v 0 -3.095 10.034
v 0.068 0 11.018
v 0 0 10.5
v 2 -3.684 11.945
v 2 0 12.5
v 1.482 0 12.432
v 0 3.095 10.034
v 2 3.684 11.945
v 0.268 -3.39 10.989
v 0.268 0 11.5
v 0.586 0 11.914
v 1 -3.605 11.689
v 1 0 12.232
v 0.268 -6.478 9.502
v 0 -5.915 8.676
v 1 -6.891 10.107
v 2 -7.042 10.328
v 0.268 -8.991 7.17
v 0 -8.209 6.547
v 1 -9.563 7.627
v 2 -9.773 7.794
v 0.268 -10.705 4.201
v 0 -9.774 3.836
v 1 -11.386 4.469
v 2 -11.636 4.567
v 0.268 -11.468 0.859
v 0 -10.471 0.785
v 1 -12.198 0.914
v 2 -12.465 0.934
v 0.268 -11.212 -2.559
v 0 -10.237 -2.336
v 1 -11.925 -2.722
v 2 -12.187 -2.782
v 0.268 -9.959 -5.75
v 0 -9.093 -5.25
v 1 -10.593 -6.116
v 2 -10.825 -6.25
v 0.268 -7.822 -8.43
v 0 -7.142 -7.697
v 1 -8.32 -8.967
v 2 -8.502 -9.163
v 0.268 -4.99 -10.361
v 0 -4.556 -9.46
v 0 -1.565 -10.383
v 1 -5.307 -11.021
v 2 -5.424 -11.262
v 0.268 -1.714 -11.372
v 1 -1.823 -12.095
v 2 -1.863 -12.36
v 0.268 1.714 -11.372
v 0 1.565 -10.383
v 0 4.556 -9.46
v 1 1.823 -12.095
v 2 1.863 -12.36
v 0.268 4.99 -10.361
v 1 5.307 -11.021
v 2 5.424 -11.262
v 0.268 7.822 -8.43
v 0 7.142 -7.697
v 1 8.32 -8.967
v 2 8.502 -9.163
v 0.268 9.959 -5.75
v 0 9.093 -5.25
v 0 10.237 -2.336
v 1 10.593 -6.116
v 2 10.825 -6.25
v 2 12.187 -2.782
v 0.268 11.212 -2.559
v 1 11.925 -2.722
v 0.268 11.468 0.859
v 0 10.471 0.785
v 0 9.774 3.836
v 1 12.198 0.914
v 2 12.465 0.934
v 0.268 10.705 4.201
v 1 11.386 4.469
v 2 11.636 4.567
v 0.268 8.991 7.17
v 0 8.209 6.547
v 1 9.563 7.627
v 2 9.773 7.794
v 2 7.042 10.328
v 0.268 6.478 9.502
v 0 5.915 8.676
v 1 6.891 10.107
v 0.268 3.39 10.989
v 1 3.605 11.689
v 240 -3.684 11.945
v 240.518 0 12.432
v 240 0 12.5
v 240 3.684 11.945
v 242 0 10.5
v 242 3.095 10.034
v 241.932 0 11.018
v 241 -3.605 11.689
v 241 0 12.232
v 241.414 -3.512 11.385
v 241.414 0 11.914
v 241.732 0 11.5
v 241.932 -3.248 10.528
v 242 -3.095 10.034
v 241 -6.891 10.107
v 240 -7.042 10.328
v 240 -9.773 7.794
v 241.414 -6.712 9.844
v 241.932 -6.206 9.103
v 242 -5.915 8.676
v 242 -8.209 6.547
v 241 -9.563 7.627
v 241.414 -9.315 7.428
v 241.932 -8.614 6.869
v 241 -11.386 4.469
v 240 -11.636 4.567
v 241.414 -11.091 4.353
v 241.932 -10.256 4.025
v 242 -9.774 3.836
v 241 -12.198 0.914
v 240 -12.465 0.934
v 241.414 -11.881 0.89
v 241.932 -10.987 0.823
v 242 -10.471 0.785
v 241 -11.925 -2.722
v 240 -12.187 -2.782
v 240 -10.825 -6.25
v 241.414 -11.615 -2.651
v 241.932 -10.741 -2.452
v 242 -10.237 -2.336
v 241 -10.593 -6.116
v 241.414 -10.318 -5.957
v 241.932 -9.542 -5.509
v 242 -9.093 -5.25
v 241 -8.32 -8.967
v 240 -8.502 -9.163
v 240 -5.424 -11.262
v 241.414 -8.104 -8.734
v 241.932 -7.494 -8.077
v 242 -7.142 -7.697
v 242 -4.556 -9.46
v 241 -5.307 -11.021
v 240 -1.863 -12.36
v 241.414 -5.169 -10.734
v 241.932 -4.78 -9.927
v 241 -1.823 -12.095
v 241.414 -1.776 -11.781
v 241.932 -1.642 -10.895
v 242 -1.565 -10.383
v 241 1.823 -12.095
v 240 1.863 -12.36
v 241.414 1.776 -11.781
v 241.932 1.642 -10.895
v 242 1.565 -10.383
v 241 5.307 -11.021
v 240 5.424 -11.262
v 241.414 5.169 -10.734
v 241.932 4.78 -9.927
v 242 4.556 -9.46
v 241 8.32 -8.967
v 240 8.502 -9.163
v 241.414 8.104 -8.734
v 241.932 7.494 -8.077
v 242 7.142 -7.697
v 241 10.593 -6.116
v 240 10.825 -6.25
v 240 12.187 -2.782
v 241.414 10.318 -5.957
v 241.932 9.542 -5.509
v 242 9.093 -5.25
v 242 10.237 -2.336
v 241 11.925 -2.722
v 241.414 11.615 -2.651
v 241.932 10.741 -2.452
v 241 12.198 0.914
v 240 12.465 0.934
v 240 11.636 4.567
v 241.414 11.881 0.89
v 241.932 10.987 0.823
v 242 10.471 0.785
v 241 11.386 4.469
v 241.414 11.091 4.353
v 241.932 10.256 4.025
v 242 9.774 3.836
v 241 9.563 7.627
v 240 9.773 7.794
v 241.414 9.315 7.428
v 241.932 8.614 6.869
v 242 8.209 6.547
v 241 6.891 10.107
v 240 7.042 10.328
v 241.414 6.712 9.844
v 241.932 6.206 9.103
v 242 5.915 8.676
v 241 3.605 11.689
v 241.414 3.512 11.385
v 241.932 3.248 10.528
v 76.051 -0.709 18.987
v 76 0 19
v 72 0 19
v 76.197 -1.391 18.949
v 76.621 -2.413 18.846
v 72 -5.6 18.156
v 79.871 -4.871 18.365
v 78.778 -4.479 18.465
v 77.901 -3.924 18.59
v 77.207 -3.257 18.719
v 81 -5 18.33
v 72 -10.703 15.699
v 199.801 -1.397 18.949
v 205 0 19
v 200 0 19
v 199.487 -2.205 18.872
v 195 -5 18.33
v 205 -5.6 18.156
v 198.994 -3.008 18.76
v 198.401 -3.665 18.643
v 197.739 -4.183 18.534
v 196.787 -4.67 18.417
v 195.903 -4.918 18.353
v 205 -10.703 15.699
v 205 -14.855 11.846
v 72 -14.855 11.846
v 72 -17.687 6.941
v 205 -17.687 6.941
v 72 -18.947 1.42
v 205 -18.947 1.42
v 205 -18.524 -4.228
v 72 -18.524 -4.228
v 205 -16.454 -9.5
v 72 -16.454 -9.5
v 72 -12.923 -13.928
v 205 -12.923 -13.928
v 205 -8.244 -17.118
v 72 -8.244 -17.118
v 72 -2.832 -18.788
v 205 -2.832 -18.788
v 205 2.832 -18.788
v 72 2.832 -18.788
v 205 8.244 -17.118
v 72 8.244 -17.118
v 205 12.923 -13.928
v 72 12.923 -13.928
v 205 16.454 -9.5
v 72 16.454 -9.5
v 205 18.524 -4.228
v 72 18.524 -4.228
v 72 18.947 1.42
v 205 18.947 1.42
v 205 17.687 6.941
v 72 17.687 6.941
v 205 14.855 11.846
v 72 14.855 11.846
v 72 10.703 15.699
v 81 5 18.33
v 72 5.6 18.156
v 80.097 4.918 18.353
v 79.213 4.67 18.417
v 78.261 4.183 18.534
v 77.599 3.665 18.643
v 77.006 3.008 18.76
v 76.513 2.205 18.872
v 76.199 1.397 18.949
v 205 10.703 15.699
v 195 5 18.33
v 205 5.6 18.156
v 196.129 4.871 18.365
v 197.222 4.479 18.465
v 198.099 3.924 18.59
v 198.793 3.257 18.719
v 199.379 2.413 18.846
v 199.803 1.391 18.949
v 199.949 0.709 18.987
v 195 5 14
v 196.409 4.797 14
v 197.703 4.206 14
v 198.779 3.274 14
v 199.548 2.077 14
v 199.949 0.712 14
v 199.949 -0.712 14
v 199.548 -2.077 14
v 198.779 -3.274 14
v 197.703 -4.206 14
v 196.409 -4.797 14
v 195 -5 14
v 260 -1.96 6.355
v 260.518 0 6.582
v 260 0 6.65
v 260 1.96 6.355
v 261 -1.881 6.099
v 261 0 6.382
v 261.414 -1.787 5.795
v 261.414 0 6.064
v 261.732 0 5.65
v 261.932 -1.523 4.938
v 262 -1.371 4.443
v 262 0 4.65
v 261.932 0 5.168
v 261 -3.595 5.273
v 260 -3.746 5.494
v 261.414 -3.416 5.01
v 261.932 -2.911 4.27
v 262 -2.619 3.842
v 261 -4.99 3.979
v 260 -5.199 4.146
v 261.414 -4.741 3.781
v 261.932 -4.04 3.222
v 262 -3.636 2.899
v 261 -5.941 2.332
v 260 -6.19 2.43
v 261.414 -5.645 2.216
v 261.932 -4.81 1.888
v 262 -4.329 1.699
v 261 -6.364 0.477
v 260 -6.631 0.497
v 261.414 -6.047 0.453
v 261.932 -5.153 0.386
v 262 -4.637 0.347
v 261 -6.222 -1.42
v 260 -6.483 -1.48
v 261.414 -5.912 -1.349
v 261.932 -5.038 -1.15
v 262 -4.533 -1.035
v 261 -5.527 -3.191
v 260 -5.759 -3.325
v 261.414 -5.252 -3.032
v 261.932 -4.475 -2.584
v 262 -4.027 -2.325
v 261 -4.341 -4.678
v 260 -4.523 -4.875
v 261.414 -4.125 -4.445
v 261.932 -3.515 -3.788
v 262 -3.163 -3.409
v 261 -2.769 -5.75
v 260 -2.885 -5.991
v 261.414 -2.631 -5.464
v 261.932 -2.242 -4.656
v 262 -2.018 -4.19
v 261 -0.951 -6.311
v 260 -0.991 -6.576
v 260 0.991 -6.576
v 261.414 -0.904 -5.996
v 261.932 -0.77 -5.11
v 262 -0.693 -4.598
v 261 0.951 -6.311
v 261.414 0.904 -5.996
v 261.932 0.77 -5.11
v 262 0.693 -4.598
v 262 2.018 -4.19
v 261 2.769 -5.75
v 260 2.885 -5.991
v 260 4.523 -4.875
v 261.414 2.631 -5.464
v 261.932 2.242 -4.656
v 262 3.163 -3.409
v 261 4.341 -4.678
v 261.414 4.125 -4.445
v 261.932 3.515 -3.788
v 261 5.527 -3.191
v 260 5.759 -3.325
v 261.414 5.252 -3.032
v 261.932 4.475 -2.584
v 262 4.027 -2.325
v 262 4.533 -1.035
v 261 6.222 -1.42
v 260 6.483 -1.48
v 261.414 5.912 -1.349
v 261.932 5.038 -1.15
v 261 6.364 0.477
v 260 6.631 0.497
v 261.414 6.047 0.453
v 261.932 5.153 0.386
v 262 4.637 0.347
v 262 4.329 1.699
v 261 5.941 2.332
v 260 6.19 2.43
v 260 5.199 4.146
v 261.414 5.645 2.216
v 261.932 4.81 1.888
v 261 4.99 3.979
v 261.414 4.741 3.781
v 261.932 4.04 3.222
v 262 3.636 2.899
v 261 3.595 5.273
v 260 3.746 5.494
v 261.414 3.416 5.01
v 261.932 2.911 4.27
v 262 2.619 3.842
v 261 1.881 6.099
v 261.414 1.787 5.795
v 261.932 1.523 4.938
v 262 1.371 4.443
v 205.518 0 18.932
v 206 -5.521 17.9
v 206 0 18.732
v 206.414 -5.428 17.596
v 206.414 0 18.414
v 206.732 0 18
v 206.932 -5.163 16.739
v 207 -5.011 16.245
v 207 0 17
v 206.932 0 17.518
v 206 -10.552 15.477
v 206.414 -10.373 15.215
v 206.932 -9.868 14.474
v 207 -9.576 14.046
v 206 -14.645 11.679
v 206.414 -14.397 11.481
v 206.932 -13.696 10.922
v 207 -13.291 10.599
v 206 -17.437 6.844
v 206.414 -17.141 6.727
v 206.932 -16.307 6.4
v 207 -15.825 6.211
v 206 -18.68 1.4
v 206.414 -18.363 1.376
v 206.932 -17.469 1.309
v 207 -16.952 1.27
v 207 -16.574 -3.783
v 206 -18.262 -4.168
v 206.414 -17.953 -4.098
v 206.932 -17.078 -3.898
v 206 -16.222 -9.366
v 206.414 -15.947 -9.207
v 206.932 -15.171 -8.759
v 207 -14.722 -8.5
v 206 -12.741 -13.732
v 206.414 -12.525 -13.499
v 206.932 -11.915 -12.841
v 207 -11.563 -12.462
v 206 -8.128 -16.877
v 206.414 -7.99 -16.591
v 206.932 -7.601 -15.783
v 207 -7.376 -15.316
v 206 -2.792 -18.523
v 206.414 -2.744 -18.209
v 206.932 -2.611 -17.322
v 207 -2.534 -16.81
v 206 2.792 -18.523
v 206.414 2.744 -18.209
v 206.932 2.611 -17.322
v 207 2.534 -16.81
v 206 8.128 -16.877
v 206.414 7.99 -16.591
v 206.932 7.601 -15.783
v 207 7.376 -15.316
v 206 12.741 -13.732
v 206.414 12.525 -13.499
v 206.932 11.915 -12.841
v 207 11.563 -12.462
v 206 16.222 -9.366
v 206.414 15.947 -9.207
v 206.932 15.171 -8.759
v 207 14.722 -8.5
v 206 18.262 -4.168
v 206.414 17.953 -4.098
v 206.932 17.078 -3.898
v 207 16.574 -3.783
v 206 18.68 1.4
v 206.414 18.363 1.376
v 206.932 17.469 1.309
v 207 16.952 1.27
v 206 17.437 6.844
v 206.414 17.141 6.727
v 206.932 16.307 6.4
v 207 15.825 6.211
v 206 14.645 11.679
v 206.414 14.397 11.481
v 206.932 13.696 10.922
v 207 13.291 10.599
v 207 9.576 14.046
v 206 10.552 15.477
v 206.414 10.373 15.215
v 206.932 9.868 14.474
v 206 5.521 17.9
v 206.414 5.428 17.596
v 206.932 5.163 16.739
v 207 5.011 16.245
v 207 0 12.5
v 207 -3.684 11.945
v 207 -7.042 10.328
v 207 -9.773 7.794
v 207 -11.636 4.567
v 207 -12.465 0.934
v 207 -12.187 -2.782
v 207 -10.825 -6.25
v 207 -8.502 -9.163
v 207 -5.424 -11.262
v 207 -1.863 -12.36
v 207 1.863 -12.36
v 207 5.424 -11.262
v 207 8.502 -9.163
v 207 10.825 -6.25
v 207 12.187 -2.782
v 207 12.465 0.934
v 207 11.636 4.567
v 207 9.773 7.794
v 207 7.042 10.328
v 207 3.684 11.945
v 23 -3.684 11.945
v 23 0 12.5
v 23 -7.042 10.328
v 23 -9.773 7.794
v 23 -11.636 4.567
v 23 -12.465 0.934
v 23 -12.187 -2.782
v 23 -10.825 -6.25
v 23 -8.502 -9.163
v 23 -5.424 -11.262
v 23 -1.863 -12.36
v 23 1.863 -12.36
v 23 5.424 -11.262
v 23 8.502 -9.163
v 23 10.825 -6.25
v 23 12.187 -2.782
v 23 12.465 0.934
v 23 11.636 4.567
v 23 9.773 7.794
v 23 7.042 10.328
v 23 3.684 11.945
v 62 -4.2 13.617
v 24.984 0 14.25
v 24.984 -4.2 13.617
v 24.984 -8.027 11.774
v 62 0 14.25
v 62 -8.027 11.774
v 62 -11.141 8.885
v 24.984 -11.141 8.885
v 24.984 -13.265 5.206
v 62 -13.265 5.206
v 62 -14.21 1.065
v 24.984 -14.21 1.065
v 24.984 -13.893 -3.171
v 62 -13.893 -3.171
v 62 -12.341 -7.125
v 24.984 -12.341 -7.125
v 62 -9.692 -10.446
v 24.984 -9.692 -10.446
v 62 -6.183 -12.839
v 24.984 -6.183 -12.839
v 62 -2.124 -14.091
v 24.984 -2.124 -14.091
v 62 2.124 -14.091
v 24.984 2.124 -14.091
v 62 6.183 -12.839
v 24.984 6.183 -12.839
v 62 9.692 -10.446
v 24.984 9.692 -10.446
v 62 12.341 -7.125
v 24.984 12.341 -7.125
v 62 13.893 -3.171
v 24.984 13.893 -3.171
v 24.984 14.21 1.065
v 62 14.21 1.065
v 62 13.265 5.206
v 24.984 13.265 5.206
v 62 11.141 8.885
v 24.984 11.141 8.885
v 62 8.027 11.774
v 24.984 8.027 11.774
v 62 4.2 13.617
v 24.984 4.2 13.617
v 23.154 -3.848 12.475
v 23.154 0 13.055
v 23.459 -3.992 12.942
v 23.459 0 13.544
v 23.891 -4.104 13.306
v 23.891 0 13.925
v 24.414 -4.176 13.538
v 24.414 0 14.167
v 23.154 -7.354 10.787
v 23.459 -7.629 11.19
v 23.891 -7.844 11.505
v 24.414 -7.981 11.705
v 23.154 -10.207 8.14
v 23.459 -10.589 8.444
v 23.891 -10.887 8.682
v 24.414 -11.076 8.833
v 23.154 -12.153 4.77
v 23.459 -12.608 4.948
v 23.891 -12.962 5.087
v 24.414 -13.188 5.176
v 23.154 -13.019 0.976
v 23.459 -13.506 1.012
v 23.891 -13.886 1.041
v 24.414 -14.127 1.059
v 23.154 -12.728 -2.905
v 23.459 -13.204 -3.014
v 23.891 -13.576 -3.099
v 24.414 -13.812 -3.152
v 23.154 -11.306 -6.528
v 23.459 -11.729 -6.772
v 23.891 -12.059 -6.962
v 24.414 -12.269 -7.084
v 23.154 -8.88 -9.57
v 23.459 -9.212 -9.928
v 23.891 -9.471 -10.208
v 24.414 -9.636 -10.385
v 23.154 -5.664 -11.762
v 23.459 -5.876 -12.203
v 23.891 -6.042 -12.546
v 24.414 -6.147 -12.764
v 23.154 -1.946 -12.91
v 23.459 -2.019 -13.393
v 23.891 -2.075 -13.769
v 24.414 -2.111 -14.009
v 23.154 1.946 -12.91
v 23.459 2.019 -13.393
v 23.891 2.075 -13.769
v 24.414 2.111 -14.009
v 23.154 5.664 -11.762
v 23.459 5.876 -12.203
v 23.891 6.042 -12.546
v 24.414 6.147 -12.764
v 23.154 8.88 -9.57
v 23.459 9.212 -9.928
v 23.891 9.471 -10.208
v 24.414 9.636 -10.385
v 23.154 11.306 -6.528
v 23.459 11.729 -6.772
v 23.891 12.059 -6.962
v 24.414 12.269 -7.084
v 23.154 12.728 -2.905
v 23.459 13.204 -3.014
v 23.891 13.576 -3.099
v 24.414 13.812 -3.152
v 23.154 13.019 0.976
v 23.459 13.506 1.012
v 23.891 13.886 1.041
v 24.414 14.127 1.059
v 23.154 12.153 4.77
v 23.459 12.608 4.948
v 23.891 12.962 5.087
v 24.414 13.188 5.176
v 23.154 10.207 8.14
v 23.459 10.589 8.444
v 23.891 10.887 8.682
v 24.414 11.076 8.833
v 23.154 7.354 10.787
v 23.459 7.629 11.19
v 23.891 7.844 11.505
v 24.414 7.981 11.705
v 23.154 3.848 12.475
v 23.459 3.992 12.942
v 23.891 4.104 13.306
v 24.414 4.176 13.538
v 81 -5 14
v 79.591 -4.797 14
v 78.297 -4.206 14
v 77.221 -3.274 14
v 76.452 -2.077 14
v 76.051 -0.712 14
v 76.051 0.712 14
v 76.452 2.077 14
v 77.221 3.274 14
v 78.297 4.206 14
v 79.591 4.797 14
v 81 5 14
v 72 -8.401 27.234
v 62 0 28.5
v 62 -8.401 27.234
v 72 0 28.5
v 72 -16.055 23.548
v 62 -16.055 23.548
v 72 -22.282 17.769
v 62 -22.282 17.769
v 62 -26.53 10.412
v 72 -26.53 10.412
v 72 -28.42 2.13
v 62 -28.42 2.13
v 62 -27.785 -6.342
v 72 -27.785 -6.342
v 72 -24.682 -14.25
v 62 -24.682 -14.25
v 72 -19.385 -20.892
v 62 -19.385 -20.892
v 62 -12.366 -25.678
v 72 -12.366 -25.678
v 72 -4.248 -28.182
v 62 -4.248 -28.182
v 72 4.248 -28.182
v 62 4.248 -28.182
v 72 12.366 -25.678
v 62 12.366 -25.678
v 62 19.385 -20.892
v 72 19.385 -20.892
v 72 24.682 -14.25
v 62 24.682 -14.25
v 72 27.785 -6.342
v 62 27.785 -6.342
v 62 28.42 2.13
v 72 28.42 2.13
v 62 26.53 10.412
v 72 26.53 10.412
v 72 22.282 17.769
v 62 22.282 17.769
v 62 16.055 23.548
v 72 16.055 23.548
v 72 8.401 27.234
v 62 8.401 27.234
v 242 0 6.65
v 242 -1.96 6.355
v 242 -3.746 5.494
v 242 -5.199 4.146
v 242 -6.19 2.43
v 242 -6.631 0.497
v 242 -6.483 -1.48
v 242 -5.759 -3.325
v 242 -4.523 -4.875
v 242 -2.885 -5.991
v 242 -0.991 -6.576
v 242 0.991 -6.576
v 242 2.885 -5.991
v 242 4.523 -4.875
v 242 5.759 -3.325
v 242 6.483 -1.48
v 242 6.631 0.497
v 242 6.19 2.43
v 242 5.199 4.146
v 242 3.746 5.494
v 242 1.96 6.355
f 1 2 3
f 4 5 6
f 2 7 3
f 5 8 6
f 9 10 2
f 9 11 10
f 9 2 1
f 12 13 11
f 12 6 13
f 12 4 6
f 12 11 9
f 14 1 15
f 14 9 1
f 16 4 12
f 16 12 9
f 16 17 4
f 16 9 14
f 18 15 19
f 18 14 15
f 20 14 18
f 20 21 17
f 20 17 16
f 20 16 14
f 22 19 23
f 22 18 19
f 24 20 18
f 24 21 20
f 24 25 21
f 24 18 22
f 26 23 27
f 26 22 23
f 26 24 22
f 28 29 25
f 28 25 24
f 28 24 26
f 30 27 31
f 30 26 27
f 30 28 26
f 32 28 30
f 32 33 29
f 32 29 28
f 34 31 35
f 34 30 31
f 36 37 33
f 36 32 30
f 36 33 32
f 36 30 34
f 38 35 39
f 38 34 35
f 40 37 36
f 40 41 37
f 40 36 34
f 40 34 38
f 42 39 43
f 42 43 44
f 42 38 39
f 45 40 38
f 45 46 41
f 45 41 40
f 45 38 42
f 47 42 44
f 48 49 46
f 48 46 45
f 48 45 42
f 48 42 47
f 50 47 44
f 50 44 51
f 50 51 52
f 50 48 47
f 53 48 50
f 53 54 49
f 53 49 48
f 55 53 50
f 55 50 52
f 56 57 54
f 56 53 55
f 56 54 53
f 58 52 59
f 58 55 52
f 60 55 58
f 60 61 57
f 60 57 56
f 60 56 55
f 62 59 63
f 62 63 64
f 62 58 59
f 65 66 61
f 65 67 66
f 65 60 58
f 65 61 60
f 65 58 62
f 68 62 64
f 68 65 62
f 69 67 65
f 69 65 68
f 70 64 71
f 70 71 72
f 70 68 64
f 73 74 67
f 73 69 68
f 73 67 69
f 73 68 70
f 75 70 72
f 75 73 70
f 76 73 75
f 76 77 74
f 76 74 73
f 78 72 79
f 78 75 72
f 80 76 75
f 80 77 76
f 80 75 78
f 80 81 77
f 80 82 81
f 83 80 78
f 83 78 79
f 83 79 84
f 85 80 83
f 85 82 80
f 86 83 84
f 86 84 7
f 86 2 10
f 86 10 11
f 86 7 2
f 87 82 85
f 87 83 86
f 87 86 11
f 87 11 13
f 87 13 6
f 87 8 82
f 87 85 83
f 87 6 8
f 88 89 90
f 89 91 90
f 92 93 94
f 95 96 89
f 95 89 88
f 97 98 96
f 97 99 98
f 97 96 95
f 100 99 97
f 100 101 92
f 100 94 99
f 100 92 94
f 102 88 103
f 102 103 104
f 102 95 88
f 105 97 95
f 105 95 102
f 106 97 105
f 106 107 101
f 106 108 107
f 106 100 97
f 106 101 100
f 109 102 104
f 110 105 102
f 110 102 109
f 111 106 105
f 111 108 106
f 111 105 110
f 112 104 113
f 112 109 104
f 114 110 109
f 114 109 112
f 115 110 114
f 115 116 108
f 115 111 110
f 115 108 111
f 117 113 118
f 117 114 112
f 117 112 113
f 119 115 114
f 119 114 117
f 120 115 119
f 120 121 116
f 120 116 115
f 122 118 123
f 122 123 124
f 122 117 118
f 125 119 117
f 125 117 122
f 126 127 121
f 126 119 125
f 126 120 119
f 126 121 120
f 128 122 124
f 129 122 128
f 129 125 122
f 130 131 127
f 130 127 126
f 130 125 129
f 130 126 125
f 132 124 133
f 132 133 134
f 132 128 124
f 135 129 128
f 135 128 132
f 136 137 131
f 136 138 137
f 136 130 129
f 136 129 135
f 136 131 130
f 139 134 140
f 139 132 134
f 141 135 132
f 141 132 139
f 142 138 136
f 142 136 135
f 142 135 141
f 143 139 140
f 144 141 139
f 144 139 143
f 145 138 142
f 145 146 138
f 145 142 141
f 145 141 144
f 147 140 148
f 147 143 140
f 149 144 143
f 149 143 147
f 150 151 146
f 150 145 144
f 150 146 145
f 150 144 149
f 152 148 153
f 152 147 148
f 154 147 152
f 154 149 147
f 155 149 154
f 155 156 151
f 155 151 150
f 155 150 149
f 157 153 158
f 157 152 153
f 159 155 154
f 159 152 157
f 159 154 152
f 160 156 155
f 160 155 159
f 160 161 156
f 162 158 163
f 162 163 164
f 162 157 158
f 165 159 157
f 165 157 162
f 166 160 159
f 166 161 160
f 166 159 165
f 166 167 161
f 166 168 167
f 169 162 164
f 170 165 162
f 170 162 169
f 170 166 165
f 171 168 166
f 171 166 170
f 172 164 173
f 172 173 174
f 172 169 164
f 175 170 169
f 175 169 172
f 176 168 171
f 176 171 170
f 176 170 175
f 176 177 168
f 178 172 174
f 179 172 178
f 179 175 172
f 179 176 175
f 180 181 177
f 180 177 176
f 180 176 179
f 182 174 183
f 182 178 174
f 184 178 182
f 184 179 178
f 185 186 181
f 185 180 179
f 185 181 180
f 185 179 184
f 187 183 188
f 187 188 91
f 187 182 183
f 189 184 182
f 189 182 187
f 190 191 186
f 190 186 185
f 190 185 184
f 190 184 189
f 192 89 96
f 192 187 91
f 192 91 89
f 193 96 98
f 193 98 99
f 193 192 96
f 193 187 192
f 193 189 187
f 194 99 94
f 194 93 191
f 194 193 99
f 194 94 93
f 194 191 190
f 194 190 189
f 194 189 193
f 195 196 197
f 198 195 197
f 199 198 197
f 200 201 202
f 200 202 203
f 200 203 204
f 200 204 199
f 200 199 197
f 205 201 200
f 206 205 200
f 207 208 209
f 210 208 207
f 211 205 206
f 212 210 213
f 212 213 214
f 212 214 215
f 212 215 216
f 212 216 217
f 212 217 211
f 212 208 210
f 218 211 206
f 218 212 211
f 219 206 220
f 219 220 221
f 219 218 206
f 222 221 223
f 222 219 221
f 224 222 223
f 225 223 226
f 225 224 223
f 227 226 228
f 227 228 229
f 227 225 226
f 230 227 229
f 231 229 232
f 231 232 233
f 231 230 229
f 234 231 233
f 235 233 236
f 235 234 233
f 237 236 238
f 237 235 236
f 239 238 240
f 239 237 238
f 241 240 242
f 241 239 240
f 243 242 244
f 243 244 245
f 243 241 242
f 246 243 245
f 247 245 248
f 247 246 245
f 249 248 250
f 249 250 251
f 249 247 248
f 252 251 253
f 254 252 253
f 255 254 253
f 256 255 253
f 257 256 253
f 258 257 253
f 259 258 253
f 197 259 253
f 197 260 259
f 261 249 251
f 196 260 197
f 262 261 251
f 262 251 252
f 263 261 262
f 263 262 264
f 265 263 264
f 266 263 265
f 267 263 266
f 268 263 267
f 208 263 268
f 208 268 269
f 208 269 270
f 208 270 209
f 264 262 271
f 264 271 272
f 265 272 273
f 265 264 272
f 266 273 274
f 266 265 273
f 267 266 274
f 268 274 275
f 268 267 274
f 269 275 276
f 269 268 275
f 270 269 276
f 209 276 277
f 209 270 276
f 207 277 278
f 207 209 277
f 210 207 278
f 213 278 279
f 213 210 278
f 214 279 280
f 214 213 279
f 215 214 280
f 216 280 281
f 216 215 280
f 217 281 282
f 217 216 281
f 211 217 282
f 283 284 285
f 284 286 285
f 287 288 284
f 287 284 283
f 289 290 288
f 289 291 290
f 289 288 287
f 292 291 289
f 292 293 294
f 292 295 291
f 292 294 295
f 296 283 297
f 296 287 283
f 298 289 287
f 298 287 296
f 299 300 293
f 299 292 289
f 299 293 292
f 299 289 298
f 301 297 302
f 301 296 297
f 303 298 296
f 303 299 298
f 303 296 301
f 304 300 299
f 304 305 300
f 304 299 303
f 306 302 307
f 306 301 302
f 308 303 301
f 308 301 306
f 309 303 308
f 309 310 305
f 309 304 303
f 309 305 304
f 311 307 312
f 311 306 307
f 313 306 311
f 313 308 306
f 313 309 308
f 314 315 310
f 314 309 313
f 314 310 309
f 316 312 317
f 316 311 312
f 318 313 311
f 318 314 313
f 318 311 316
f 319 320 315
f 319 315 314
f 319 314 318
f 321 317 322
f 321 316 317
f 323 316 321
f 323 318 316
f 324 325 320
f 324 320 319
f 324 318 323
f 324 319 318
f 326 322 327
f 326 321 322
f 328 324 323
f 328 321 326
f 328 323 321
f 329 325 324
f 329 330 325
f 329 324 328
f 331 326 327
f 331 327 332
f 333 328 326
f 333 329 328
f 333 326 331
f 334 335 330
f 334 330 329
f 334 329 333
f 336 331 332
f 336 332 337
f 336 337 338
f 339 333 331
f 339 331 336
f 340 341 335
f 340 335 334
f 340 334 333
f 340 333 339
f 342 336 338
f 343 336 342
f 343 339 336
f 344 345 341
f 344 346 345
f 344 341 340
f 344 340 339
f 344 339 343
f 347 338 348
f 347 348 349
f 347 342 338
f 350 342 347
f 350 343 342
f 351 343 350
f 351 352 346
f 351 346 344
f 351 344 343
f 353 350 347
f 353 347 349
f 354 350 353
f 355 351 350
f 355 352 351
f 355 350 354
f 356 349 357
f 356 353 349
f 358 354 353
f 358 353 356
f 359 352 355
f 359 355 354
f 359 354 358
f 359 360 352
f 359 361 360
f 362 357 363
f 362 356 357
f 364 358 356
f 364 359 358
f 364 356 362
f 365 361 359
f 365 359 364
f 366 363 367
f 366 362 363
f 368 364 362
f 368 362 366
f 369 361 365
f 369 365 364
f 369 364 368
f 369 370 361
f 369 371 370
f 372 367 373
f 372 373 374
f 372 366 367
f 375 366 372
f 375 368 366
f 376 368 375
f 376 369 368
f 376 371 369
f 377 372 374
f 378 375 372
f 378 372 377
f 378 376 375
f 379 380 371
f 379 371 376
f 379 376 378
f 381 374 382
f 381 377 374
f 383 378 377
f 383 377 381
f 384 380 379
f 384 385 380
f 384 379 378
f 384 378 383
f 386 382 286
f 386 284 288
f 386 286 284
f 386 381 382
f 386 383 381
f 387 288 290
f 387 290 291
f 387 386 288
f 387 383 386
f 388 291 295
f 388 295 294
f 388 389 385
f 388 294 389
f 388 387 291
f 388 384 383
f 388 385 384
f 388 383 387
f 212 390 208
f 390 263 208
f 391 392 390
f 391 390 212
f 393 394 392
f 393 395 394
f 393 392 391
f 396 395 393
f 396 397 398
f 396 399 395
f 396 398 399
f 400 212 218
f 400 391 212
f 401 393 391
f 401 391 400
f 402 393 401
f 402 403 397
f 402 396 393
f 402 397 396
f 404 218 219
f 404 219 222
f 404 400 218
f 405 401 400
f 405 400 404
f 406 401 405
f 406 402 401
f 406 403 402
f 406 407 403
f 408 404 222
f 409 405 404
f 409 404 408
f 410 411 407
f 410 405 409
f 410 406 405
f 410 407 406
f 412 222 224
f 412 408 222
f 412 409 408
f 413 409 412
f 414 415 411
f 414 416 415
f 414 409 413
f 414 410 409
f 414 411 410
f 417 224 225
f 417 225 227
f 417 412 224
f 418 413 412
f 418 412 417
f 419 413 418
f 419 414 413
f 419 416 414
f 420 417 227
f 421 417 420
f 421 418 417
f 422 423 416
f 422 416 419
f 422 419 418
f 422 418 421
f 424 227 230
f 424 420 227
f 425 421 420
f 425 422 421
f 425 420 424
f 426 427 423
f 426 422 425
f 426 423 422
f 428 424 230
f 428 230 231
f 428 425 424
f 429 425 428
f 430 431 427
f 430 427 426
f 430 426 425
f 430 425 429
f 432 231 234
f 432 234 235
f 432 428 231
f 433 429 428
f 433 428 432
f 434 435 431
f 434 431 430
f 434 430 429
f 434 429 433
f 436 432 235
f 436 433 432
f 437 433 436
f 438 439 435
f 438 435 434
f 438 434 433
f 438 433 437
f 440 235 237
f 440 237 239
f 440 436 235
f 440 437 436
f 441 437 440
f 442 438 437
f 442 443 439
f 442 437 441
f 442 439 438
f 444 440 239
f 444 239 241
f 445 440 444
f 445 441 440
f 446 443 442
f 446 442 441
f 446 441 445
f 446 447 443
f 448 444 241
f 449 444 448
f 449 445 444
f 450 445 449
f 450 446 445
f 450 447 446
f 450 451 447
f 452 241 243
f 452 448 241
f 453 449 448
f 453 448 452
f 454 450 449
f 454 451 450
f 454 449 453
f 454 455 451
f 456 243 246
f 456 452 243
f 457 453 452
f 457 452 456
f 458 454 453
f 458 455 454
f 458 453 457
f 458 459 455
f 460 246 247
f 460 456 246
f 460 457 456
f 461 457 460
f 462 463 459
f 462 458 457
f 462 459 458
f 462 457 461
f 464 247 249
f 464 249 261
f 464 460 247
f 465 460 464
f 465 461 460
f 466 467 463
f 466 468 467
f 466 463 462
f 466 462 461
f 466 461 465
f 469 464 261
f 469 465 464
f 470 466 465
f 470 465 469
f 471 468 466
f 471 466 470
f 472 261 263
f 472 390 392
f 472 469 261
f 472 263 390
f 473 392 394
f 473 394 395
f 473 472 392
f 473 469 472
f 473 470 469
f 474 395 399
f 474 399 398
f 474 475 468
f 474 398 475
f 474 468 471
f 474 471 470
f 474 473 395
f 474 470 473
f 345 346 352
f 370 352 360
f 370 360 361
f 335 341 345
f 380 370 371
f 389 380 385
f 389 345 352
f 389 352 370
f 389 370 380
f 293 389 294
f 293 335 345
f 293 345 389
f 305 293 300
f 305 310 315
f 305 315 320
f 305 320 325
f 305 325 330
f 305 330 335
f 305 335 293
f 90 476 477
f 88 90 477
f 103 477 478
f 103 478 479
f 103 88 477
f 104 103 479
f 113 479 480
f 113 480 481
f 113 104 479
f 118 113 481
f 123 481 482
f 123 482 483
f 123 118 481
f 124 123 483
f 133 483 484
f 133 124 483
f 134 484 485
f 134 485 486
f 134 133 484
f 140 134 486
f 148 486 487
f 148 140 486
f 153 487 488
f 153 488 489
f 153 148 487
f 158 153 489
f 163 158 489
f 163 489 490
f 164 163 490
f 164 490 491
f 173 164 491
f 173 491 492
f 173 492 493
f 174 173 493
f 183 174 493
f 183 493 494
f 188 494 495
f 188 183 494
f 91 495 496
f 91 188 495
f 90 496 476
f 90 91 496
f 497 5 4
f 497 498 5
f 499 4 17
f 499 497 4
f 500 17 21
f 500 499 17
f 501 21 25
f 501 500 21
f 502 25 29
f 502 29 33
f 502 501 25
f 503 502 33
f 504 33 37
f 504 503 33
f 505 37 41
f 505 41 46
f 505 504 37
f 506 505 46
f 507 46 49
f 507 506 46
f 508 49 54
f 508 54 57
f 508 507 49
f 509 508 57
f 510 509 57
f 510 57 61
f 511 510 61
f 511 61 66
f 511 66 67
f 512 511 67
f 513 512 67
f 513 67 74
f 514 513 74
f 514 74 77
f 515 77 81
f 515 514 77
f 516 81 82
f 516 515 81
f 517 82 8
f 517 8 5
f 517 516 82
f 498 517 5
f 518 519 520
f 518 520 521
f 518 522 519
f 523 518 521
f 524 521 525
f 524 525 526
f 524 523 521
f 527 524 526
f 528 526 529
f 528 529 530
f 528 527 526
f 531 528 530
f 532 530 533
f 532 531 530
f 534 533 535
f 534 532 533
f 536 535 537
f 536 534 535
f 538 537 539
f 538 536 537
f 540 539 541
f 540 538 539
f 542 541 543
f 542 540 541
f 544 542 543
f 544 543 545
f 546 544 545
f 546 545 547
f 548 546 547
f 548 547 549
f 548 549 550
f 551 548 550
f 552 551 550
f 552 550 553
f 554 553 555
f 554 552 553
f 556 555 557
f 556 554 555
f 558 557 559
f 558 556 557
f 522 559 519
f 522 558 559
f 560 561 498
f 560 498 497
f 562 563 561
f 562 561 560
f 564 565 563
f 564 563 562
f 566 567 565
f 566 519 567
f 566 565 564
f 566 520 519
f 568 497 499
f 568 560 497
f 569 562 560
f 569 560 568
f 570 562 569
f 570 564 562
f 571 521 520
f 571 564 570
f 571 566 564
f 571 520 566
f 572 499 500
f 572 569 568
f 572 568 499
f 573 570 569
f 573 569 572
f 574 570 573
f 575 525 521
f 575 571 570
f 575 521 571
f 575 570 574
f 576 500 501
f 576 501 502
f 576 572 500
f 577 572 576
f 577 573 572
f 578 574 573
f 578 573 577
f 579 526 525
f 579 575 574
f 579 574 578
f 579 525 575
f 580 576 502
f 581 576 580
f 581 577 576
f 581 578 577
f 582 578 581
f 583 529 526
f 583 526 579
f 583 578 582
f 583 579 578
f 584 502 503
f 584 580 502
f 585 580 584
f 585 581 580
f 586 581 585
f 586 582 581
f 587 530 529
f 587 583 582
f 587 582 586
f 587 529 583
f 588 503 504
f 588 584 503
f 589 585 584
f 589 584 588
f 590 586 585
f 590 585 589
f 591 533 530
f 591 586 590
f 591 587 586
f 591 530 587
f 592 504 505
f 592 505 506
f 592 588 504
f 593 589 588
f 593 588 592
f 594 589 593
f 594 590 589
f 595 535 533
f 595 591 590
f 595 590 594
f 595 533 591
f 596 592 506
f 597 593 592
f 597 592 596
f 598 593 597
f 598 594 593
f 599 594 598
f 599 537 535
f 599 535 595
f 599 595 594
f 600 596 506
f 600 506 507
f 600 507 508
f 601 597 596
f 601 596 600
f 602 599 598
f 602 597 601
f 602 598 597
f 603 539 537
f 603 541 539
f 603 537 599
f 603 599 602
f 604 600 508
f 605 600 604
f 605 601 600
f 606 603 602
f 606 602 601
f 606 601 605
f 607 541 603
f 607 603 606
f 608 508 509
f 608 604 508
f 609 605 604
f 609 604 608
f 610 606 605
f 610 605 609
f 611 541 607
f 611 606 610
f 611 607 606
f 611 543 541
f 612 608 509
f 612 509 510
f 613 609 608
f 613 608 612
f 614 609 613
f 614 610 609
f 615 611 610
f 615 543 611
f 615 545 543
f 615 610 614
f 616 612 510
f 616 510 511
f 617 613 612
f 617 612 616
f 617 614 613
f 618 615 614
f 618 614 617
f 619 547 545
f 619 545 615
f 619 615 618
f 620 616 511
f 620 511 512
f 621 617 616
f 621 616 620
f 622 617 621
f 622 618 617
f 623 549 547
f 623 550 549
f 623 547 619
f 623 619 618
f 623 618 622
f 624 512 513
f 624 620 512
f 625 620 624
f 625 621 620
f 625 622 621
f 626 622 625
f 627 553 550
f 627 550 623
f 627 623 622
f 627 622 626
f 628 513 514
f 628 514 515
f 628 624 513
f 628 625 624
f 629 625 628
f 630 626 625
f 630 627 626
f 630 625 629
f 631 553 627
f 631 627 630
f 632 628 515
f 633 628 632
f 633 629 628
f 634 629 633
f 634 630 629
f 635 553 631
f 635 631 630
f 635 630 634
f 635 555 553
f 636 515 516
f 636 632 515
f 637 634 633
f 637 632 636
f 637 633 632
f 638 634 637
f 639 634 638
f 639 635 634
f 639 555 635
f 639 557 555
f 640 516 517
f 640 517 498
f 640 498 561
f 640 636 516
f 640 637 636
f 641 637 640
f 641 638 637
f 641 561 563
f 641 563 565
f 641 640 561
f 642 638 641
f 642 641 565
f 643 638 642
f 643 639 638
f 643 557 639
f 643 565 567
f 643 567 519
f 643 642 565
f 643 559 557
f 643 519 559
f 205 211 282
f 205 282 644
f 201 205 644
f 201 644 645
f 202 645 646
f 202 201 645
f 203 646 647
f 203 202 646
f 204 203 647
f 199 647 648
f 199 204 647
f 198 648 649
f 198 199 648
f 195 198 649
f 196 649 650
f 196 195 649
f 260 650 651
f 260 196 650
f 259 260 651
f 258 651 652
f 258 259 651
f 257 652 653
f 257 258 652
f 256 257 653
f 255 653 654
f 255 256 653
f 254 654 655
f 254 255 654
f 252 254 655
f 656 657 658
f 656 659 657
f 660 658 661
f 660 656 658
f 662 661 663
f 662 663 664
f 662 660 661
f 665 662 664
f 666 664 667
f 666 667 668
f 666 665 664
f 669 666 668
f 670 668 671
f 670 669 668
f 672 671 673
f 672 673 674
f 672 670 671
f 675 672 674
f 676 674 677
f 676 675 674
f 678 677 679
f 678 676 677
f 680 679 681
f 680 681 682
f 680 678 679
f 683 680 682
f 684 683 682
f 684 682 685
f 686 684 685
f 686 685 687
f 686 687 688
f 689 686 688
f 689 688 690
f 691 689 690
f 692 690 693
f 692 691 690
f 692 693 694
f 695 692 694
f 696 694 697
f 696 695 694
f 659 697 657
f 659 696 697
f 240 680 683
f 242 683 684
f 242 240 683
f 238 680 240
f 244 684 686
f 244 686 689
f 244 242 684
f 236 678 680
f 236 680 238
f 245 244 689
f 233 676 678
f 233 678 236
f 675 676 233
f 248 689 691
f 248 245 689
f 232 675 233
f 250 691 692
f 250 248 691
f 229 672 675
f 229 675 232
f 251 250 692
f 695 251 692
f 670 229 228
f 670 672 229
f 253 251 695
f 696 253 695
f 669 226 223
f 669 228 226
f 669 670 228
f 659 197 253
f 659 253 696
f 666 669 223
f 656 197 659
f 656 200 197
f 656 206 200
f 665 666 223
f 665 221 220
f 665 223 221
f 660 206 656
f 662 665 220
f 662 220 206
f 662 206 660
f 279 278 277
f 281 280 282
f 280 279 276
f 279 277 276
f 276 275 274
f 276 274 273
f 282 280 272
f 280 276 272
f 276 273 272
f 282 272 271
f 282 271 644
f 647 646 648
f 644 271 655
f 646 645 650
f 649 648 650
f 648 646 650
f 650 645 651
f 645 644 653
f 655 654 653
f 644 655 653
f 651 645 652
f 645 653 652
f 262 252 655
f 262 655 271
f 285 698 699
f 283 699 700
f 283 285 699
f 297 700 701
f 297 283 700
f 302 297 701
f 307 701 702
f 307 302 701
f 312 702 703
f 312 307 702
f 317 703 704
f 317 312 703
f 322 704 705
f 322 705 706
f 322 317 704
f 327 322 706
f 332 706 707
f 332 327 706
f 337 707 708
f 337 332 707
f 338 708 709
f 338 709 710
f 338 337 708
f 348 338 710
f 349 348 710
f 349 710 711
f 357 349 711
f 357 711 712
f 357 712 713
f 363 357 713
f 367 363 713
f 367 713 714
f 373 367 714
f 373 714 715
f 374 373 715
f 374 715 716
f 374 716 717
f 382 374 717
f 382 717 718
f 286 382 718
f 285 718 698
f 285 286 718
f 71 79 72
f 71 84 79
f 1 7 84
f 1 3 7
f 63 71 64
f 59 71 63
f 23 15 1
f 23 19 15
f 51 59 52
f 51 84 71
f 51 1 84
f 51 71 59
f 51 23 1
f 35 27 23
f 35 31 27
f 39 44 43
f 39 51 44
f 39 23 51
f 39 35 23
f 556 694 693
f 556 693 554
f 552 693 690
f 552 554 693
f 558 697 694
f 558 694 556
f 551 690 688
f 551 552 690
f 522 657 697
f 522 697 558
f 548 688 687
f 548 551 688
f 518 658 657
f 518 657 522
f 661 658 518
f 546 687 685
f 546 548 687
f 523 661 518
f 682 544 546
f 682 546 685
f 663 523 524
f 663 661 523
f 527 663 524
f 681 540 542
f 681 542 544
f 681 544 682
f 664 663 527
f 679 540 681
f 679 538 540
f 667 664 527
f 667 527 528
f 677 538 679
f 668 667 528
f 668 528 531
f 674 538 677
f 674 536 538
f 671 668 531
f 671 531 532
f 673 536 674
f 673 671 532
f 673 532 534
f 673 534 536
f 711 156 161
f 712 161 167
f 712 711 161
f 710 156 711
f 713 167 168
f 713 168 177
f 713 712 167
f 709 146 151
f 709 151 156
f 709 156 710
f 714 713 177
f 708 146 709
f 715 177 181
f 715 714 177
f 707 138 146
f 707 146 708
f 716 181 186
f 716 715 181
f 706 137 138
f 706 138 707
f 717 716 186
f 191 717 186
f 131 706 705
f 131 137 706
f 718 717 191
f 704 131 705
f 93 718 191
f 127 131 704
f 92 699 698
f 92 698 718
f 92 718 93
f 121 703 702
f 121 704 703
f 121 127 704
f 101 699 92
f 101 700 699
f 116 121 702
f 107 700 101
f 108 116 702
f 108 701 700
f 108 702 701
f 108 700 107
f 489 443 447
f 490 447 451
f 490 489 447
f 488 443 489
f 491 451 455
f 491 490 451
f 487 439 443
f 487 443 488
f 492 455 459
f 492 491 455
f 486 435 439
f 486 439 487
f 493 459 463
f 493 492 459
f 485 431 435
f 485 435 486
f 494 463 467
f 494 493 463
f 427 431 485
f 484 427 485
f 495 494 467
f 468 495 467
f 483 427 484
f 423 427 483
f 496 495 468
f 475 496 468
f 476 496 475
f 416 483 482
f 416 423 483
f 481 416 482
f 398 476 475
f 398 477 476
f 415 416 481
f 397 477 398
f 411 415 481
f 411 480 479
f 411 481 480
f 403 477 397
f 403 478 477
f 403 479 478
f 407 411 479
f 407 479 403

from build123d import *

# Parameters (mm, degrees)
FILLET_1_R          = 2
CUT_EXTRUDE_1_DEPTH = 5


with BuildPart() as part:
    # Эскиз1 → Повернуть1 (revolve)
    with BuildSketch(Plane(origin=(0, 0, 0), x_dir=(1, 0, 0), z_dir=(0, 1, 0)), mode=Mode.PRIVATE) as revolve_1_sk:
        Polygon((0, 0), (0, 12.5), (23, 12.5), (23, 14.25), (62, 14.25), (62, 28.5), (72, 28.5), (72, 19), (207, 19), (207, 12.5), (242, 12.5), (242, 6.65), (262, 6.65), (262, 0), align=None)
    revolve(revolve_1_sk.sketch.rotate(Axis((0, 0, 0), (1, 0, 0)), 180), axis=Axis((0, 0, 0), (1, 0, 0)))

    # Скругление1
    # the kernel refuses this fillet: 2 mm, written as the material it takes off along each edge
    with BuildSketch(Plane(origin=(262, 0, 0), x_dir=(0, 0, 1), z_dir=(0, 1, 0))) as fillet_1_piece_1:
        with BuildLine():
            CenterArc((6.65 - FILLET_1_R, -FILLET_1_R), FILLET_1_R, 0, 90)
            Line((6.65 - FILLET_1_R, 0), (6.65 - FILLET_1_R, FILLET_1_R * 0.02))
            Line((6.65 - FILLET_1_R, FILLET_1_R * 0.02), (6.65 + FILLET_1_R * 0.02, FILLET_1_R * 0.02))
            Line((6.65 + FILLET_1_R * 0.02, FILLET_1_R * 0.02), (6.65 + FILLET_1_R * 0.02, -FILLET_1_R))
            Line((6.65 + FILLET_1_R * 0.02, -FILLET_1_R), (6.65, -FILLET_1_R))
        make_face()
    revolve(axis=Axis((262, 0, 0), (1, 0, 0)), mode=Mode.SUBTRACT)
    with BuildSketch(Plane(origin=(242, 0, 0), x_dir=(0, 0, 1), z_dir=(0, 1, 0))) as fillet_1_piece_2:
        with BuildLine():
            CenterArc((12.5 - FILLET_1_R, -FILLET_1_R), FILLET_1_R, 0, 90)
            Line((12.5 - FILLET_1_R, 0), (12.5 - FILLET_1_R, FILLET_1_R * 0.02))
            Line((12.5 - FILLET_1_R, FILLET_1_R * 0.02), (12.5 + FILLET_1_R * 0.02, FILLET_1_R * 0.02))
            Line((12.5 + FILLET_1_R * 0.02, FILLET_1_R * 0.02), (12.5 + FILLET_1_R * 0.02, -FILLET_1_R))
            Line((12.5 + FILLET_1_R * 0.02, -FILLET_1_R), (12.5, -FILLET_1_R))
        make_face()
    revolve(axis=Axis((242, 0, 0), (1, 0, 0)), mode=Mode.SUBTRACT)
    with BuildSketch(Plane(origin=(207, 0, 0), x_dir=(0, 0, 1), z_dir=(0, 1, 0))) as fillet_1_piece_3:
        with BuildLine():
            CenterArc((19 - FILLET_1_R, -FILLET_1_R), FILLET_1_R, 0, 90)
            Line((19 - FILLET_1_R, 0), (19 - FILLET_1_R, FILLET_1_R * 0.02))
            Line((19 - FILLET_1_R, FILLET_1_R * 0.02), (19 + FILLET_1_R * 0.02, FILLET_1_R * 0.02))
            Line((19 + FILLET_1_R * 0.02, FILLET_1_R * 0.02), (19 + FILLET_1_R * 0.02, -FILLET_1_R))
            Line((19 + FILLET_1_R * 0.02, -FILLET_1_R), (19, -FILLET_1_R))
        make_face()
    revolve(axis=Axis((207, 0, 0), (1, 0, 0)), mode=Mode.SUBTRACT)
    with BuildSketch(Plane(origin=(23, 0, 0), x_dir=(0, 0, 1), z_dir=(0, 1, 0))) as fillet_1_piece_4:
        with BuildLine():
            CenterArc((12.25, 1.984313483), FILLET_1_R, 277.180755781, 82.819244219)
            Line((14.25, 1.984313483), (14.29, 1.984313483))
            Line((14.29, 1.984313483), (14.29, 0))
            Line((14.29, 0), (14.25, -0.04))
            ThreePointArc((14.25, -0.04), (13.375, -0.04), (12.505, -0.03968627))
            Line((12.505, -0.03968627), (12.5, 0))
        make_face()
    revolve(axis=Axis((23, 0, 0), (1, 0, 0)), mode=Mode.SUBTRACT)
    with BuildSketch(Plane(origin=(0, 0, 0), x_dir=(0, 0, 1), z_dir=(0, 1, 0))) as fillet_1_piece_5:
        with BuildLine():
            CenterArc((12.5 - FILLET_1_R, FILLET_1_R), FILLET_1_R, 270, 90)
            Line((12.5, FILLET_1_R), (12.5 + FILLET_1_R * 0.02, FILLET_1_R))
            Line((12.5 + FILLET_1_R * 0.02, FILLET_1_R), (12.5 + FILLET_1_R * 0.02, -FILLET_1_R * 0.02))
            Line((12.5 + FILLET_1_R * 0.02, -FILLET_1_R * 0.02), (12.5 - FILLET_1_R, -FILLET_1_R * 0.02))
            Line((12.5 - FILLET_1_R, -FILLET_1_R * 0.02), (12.5 - FILLET_1_R, 0))
        make_face()
    revolve(axis=Axis((0, 0, 0), (1, 0, 0)), mode=Mode.SUBTRACT)

    # Эскиз2 → Вырез-Вытянуть1 (cut)
    with BuildSketch(Plane.XY.offset(19)):
        with BuildLine():
            Line((81, 5), (195, 5))
            ThreePointArc((195, 5), (200, 0), (195, -5))
            Line((195, -5), (81, -5))
            ThreePointArc((81, -5), (76, 0), (81, 5))
        make_face()
    extrude(amount=-CUT_EXTRUDE_1_DEPTH, mode=Mode.SUBTRACT)


solid = part.part
